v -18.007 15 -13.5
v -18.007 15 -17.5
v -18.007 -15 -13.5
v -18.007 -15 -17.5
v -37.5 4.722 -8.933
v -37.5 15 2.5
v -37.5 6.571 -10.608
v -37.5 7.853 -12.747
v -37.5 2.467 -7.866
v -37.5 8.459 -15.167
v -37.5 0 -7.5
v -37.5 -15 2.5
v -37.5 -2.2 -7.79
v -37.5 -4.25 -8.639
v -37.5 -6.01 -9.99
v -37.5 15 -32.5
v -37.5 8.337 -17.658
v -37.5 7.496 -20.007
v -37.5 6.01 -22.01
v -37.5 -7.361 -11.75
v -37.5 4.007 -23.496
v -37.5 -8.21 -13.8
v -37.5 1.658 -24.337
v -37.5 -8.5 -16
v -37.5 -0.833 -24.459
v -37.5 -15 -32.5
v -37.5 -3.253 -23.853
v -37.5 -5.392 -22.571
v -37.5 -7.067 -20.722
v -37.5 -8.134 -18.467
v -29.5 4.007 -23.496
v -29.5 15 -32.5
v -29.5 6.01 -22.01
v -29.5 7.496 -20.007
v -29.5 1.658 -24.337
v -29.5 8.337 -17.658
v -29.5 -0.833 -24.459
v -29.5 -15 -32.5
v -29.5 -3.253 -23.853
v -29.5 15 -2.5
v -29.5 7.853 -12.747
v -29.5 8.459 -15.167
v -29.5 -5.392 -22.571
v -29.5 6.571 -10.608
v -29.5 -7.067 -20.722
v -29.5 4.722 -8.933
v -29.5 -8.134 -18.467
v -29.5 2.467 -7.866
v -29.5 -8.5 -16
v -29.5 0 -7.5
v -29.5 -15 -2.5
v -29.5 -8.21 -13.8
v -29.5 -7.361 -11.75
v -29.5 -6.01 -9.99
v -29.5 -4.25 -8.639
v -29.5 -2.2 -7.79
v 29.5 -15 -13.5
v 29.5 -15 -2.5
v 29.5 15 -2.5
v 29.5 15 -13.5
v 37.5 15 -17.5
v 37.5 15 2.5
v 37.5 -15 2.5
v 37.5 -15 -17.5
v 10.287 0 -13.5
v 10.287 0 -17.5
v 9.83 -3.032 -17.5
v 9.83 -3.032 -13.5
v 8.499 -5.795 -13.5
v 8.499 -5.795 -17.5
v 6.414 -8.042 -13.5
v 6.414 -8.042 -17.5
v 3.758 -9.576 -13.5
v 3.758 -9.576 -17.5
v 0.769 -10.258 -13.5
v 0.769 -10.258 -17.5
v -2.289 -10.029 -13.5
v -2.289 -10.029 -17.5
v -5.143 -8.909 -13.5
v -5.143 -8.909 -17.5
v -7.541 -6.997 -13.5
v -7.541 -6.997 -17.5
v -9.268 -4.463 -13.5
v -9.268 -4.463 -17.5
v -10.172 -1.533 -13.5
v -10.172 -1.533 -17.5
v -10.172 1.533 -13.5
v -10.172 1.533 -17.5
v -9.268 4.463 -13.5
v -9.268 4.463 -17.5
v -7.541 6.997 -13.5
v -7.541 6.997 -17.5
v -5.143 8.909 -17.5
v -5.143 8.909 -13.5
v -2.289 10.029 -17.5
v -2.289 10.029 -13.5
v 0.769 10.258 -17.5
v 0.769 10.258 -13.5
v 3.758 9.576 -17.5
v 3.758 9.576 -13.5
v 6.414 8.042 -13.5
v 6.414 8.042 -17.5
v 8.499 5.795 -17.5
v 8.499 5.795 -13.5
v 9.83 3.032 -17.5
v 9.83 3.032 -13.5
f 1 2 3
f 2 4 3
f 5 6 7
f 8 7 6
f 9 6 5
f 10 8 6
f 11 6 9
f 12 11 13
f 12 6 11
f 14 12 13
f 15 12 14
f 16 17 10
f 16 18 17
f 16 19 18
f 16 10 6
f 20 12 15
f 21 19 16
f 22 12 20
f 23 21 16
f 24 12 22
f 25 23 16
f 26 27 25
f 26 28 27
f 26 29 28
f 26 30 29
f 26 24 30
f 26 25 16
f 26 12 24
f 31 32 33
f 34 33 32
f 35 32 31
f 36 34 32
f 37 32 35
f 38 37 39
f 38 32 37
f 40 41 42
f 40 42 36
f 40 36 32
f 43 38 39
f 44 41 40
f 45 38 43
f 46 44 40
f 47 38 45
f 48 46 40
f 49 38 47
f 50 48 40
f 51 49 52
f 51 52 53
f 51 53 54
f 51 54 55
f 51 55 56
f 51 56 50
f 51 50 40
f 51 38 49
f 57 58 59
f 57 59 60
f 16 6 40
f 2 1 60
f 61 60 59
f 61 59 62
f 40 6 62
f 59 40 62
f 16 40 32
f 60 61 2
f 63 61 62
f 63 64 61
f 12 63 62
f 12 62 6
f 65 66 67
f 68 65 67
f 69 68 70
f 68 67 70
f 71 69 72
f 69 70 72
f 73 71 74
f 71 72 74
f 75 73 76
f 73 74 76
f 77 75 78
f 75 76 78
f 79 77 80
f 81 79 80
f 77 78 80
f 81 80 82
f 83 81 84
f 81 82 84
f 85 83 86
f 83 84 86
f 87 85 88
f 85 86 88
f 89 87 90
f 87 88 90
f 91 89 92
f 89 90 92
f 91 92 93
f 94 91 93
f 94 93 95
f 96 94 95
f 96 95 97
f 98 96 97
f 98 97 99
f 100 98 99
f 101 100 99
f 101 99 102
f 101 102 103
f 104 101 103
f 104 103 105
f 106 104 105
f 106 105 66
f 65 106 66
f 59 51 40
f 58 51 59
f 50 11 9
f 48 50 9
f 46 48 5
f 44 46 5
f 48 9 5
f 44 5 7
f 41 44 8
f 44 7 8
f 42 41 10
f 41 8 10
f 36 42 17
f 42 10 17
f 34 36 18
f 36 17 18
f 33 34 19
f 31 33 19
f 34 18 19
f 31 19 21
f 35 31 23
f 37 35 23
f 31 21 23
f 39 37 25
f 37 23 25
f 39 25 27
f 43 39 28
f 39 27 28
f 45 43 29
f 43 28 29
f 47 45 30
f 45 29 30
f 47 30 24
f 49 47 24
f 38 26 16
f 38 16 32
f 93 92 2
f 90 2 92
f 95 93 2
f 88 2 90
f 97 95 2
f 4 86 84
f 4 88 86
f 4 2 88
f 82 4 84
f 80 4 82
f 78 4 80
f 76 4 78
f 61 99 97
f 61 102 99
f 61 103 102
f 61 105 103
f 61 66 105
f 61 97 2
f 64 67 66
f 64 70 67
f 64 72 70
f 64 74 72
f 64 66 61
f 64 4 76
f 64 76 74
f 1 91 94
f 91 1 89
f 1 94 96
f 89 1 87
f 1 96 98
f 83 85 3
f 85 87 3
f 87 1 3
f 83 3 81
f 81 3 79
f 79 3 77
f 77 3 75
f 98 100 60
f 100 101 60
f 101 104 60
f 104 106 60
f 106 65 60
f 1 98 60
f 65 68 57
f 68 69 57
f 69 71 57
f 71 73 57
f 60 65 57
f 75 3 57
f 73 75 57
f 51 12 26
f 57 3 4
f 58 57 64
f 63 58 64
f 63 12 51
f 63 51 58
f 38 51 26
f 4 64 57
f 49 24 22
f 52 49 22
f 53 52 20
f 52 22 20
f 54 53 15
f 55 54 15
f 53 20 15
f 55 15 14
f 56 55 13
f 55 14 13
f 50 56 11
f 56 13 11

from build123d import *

# Parameters (mm, degrees)
F0_W     = 47.5073454976
F0_H     = 4
F0_W_2   = 8
F0_H_2   = 30
F1_DEPTH = 15
F3_R     = 10.286668946
F4_DEPTH = 10
F6_DEPTH = 10


with BuildPart() as f1:
    # F0 (on Front) → F1 (new body)
    with BuildSketch(Plane.XZ):
        Polygon((37.5, -17.5), (37.5, -2.5), (29.5, -2.5), (29.5, -13.5), (29.5, -17.5), align=None)
        with Locations((5.7463272512, -15.5)):
            Rectangle(F0_W, F0_H)
        Polygon((37.5, 2.5), (-37.5, 2.5), (-37.5, -2.5), (-29.5, -2.5), (29.5, -2.5), (37.5, -2.5), align=None)
        with Locations((-33.5, -17.5)):
            Rectangle(F0_W_2, F0_H_2)
    extrude(amount=F1_DEPTH)

    # F2: F1 across plane


with BuildPart() as f1_1:
    add(f1.part)
    add(f1.part.mirror(Plane.XZ))

    # F3 (on face) → F4 (cut)
    with BuildSketch(Plane(origin=(0, 0, -17.5), x_dir=(1, 0, 0), z_dir=(0, 0, -1))):
        Circle(F3_R)
    extrude(amount=-F4_DEPTH, mode=Mode.SUBTRACT)

    # F5 (on face) → F6 (cut)
    with BuildSketch(Plane(origin=(-37.5, 0, 0), x_dir=(0, -1, 0), z_dir=(-1, 0, 0))):
        with BuildLine():
            ThreePointArc((8.5, -16), (6.0104076401, -9.9895923599), (0, -7.5))
            ThreePointArc((0, -7.5), (-6.0104076401, -22.0104076401), (8.5, -16))
        make_face()
    extrude(amount=-F6_DEPTH, mode=Mode.SUBTRACT)


solid = f1_1.part
